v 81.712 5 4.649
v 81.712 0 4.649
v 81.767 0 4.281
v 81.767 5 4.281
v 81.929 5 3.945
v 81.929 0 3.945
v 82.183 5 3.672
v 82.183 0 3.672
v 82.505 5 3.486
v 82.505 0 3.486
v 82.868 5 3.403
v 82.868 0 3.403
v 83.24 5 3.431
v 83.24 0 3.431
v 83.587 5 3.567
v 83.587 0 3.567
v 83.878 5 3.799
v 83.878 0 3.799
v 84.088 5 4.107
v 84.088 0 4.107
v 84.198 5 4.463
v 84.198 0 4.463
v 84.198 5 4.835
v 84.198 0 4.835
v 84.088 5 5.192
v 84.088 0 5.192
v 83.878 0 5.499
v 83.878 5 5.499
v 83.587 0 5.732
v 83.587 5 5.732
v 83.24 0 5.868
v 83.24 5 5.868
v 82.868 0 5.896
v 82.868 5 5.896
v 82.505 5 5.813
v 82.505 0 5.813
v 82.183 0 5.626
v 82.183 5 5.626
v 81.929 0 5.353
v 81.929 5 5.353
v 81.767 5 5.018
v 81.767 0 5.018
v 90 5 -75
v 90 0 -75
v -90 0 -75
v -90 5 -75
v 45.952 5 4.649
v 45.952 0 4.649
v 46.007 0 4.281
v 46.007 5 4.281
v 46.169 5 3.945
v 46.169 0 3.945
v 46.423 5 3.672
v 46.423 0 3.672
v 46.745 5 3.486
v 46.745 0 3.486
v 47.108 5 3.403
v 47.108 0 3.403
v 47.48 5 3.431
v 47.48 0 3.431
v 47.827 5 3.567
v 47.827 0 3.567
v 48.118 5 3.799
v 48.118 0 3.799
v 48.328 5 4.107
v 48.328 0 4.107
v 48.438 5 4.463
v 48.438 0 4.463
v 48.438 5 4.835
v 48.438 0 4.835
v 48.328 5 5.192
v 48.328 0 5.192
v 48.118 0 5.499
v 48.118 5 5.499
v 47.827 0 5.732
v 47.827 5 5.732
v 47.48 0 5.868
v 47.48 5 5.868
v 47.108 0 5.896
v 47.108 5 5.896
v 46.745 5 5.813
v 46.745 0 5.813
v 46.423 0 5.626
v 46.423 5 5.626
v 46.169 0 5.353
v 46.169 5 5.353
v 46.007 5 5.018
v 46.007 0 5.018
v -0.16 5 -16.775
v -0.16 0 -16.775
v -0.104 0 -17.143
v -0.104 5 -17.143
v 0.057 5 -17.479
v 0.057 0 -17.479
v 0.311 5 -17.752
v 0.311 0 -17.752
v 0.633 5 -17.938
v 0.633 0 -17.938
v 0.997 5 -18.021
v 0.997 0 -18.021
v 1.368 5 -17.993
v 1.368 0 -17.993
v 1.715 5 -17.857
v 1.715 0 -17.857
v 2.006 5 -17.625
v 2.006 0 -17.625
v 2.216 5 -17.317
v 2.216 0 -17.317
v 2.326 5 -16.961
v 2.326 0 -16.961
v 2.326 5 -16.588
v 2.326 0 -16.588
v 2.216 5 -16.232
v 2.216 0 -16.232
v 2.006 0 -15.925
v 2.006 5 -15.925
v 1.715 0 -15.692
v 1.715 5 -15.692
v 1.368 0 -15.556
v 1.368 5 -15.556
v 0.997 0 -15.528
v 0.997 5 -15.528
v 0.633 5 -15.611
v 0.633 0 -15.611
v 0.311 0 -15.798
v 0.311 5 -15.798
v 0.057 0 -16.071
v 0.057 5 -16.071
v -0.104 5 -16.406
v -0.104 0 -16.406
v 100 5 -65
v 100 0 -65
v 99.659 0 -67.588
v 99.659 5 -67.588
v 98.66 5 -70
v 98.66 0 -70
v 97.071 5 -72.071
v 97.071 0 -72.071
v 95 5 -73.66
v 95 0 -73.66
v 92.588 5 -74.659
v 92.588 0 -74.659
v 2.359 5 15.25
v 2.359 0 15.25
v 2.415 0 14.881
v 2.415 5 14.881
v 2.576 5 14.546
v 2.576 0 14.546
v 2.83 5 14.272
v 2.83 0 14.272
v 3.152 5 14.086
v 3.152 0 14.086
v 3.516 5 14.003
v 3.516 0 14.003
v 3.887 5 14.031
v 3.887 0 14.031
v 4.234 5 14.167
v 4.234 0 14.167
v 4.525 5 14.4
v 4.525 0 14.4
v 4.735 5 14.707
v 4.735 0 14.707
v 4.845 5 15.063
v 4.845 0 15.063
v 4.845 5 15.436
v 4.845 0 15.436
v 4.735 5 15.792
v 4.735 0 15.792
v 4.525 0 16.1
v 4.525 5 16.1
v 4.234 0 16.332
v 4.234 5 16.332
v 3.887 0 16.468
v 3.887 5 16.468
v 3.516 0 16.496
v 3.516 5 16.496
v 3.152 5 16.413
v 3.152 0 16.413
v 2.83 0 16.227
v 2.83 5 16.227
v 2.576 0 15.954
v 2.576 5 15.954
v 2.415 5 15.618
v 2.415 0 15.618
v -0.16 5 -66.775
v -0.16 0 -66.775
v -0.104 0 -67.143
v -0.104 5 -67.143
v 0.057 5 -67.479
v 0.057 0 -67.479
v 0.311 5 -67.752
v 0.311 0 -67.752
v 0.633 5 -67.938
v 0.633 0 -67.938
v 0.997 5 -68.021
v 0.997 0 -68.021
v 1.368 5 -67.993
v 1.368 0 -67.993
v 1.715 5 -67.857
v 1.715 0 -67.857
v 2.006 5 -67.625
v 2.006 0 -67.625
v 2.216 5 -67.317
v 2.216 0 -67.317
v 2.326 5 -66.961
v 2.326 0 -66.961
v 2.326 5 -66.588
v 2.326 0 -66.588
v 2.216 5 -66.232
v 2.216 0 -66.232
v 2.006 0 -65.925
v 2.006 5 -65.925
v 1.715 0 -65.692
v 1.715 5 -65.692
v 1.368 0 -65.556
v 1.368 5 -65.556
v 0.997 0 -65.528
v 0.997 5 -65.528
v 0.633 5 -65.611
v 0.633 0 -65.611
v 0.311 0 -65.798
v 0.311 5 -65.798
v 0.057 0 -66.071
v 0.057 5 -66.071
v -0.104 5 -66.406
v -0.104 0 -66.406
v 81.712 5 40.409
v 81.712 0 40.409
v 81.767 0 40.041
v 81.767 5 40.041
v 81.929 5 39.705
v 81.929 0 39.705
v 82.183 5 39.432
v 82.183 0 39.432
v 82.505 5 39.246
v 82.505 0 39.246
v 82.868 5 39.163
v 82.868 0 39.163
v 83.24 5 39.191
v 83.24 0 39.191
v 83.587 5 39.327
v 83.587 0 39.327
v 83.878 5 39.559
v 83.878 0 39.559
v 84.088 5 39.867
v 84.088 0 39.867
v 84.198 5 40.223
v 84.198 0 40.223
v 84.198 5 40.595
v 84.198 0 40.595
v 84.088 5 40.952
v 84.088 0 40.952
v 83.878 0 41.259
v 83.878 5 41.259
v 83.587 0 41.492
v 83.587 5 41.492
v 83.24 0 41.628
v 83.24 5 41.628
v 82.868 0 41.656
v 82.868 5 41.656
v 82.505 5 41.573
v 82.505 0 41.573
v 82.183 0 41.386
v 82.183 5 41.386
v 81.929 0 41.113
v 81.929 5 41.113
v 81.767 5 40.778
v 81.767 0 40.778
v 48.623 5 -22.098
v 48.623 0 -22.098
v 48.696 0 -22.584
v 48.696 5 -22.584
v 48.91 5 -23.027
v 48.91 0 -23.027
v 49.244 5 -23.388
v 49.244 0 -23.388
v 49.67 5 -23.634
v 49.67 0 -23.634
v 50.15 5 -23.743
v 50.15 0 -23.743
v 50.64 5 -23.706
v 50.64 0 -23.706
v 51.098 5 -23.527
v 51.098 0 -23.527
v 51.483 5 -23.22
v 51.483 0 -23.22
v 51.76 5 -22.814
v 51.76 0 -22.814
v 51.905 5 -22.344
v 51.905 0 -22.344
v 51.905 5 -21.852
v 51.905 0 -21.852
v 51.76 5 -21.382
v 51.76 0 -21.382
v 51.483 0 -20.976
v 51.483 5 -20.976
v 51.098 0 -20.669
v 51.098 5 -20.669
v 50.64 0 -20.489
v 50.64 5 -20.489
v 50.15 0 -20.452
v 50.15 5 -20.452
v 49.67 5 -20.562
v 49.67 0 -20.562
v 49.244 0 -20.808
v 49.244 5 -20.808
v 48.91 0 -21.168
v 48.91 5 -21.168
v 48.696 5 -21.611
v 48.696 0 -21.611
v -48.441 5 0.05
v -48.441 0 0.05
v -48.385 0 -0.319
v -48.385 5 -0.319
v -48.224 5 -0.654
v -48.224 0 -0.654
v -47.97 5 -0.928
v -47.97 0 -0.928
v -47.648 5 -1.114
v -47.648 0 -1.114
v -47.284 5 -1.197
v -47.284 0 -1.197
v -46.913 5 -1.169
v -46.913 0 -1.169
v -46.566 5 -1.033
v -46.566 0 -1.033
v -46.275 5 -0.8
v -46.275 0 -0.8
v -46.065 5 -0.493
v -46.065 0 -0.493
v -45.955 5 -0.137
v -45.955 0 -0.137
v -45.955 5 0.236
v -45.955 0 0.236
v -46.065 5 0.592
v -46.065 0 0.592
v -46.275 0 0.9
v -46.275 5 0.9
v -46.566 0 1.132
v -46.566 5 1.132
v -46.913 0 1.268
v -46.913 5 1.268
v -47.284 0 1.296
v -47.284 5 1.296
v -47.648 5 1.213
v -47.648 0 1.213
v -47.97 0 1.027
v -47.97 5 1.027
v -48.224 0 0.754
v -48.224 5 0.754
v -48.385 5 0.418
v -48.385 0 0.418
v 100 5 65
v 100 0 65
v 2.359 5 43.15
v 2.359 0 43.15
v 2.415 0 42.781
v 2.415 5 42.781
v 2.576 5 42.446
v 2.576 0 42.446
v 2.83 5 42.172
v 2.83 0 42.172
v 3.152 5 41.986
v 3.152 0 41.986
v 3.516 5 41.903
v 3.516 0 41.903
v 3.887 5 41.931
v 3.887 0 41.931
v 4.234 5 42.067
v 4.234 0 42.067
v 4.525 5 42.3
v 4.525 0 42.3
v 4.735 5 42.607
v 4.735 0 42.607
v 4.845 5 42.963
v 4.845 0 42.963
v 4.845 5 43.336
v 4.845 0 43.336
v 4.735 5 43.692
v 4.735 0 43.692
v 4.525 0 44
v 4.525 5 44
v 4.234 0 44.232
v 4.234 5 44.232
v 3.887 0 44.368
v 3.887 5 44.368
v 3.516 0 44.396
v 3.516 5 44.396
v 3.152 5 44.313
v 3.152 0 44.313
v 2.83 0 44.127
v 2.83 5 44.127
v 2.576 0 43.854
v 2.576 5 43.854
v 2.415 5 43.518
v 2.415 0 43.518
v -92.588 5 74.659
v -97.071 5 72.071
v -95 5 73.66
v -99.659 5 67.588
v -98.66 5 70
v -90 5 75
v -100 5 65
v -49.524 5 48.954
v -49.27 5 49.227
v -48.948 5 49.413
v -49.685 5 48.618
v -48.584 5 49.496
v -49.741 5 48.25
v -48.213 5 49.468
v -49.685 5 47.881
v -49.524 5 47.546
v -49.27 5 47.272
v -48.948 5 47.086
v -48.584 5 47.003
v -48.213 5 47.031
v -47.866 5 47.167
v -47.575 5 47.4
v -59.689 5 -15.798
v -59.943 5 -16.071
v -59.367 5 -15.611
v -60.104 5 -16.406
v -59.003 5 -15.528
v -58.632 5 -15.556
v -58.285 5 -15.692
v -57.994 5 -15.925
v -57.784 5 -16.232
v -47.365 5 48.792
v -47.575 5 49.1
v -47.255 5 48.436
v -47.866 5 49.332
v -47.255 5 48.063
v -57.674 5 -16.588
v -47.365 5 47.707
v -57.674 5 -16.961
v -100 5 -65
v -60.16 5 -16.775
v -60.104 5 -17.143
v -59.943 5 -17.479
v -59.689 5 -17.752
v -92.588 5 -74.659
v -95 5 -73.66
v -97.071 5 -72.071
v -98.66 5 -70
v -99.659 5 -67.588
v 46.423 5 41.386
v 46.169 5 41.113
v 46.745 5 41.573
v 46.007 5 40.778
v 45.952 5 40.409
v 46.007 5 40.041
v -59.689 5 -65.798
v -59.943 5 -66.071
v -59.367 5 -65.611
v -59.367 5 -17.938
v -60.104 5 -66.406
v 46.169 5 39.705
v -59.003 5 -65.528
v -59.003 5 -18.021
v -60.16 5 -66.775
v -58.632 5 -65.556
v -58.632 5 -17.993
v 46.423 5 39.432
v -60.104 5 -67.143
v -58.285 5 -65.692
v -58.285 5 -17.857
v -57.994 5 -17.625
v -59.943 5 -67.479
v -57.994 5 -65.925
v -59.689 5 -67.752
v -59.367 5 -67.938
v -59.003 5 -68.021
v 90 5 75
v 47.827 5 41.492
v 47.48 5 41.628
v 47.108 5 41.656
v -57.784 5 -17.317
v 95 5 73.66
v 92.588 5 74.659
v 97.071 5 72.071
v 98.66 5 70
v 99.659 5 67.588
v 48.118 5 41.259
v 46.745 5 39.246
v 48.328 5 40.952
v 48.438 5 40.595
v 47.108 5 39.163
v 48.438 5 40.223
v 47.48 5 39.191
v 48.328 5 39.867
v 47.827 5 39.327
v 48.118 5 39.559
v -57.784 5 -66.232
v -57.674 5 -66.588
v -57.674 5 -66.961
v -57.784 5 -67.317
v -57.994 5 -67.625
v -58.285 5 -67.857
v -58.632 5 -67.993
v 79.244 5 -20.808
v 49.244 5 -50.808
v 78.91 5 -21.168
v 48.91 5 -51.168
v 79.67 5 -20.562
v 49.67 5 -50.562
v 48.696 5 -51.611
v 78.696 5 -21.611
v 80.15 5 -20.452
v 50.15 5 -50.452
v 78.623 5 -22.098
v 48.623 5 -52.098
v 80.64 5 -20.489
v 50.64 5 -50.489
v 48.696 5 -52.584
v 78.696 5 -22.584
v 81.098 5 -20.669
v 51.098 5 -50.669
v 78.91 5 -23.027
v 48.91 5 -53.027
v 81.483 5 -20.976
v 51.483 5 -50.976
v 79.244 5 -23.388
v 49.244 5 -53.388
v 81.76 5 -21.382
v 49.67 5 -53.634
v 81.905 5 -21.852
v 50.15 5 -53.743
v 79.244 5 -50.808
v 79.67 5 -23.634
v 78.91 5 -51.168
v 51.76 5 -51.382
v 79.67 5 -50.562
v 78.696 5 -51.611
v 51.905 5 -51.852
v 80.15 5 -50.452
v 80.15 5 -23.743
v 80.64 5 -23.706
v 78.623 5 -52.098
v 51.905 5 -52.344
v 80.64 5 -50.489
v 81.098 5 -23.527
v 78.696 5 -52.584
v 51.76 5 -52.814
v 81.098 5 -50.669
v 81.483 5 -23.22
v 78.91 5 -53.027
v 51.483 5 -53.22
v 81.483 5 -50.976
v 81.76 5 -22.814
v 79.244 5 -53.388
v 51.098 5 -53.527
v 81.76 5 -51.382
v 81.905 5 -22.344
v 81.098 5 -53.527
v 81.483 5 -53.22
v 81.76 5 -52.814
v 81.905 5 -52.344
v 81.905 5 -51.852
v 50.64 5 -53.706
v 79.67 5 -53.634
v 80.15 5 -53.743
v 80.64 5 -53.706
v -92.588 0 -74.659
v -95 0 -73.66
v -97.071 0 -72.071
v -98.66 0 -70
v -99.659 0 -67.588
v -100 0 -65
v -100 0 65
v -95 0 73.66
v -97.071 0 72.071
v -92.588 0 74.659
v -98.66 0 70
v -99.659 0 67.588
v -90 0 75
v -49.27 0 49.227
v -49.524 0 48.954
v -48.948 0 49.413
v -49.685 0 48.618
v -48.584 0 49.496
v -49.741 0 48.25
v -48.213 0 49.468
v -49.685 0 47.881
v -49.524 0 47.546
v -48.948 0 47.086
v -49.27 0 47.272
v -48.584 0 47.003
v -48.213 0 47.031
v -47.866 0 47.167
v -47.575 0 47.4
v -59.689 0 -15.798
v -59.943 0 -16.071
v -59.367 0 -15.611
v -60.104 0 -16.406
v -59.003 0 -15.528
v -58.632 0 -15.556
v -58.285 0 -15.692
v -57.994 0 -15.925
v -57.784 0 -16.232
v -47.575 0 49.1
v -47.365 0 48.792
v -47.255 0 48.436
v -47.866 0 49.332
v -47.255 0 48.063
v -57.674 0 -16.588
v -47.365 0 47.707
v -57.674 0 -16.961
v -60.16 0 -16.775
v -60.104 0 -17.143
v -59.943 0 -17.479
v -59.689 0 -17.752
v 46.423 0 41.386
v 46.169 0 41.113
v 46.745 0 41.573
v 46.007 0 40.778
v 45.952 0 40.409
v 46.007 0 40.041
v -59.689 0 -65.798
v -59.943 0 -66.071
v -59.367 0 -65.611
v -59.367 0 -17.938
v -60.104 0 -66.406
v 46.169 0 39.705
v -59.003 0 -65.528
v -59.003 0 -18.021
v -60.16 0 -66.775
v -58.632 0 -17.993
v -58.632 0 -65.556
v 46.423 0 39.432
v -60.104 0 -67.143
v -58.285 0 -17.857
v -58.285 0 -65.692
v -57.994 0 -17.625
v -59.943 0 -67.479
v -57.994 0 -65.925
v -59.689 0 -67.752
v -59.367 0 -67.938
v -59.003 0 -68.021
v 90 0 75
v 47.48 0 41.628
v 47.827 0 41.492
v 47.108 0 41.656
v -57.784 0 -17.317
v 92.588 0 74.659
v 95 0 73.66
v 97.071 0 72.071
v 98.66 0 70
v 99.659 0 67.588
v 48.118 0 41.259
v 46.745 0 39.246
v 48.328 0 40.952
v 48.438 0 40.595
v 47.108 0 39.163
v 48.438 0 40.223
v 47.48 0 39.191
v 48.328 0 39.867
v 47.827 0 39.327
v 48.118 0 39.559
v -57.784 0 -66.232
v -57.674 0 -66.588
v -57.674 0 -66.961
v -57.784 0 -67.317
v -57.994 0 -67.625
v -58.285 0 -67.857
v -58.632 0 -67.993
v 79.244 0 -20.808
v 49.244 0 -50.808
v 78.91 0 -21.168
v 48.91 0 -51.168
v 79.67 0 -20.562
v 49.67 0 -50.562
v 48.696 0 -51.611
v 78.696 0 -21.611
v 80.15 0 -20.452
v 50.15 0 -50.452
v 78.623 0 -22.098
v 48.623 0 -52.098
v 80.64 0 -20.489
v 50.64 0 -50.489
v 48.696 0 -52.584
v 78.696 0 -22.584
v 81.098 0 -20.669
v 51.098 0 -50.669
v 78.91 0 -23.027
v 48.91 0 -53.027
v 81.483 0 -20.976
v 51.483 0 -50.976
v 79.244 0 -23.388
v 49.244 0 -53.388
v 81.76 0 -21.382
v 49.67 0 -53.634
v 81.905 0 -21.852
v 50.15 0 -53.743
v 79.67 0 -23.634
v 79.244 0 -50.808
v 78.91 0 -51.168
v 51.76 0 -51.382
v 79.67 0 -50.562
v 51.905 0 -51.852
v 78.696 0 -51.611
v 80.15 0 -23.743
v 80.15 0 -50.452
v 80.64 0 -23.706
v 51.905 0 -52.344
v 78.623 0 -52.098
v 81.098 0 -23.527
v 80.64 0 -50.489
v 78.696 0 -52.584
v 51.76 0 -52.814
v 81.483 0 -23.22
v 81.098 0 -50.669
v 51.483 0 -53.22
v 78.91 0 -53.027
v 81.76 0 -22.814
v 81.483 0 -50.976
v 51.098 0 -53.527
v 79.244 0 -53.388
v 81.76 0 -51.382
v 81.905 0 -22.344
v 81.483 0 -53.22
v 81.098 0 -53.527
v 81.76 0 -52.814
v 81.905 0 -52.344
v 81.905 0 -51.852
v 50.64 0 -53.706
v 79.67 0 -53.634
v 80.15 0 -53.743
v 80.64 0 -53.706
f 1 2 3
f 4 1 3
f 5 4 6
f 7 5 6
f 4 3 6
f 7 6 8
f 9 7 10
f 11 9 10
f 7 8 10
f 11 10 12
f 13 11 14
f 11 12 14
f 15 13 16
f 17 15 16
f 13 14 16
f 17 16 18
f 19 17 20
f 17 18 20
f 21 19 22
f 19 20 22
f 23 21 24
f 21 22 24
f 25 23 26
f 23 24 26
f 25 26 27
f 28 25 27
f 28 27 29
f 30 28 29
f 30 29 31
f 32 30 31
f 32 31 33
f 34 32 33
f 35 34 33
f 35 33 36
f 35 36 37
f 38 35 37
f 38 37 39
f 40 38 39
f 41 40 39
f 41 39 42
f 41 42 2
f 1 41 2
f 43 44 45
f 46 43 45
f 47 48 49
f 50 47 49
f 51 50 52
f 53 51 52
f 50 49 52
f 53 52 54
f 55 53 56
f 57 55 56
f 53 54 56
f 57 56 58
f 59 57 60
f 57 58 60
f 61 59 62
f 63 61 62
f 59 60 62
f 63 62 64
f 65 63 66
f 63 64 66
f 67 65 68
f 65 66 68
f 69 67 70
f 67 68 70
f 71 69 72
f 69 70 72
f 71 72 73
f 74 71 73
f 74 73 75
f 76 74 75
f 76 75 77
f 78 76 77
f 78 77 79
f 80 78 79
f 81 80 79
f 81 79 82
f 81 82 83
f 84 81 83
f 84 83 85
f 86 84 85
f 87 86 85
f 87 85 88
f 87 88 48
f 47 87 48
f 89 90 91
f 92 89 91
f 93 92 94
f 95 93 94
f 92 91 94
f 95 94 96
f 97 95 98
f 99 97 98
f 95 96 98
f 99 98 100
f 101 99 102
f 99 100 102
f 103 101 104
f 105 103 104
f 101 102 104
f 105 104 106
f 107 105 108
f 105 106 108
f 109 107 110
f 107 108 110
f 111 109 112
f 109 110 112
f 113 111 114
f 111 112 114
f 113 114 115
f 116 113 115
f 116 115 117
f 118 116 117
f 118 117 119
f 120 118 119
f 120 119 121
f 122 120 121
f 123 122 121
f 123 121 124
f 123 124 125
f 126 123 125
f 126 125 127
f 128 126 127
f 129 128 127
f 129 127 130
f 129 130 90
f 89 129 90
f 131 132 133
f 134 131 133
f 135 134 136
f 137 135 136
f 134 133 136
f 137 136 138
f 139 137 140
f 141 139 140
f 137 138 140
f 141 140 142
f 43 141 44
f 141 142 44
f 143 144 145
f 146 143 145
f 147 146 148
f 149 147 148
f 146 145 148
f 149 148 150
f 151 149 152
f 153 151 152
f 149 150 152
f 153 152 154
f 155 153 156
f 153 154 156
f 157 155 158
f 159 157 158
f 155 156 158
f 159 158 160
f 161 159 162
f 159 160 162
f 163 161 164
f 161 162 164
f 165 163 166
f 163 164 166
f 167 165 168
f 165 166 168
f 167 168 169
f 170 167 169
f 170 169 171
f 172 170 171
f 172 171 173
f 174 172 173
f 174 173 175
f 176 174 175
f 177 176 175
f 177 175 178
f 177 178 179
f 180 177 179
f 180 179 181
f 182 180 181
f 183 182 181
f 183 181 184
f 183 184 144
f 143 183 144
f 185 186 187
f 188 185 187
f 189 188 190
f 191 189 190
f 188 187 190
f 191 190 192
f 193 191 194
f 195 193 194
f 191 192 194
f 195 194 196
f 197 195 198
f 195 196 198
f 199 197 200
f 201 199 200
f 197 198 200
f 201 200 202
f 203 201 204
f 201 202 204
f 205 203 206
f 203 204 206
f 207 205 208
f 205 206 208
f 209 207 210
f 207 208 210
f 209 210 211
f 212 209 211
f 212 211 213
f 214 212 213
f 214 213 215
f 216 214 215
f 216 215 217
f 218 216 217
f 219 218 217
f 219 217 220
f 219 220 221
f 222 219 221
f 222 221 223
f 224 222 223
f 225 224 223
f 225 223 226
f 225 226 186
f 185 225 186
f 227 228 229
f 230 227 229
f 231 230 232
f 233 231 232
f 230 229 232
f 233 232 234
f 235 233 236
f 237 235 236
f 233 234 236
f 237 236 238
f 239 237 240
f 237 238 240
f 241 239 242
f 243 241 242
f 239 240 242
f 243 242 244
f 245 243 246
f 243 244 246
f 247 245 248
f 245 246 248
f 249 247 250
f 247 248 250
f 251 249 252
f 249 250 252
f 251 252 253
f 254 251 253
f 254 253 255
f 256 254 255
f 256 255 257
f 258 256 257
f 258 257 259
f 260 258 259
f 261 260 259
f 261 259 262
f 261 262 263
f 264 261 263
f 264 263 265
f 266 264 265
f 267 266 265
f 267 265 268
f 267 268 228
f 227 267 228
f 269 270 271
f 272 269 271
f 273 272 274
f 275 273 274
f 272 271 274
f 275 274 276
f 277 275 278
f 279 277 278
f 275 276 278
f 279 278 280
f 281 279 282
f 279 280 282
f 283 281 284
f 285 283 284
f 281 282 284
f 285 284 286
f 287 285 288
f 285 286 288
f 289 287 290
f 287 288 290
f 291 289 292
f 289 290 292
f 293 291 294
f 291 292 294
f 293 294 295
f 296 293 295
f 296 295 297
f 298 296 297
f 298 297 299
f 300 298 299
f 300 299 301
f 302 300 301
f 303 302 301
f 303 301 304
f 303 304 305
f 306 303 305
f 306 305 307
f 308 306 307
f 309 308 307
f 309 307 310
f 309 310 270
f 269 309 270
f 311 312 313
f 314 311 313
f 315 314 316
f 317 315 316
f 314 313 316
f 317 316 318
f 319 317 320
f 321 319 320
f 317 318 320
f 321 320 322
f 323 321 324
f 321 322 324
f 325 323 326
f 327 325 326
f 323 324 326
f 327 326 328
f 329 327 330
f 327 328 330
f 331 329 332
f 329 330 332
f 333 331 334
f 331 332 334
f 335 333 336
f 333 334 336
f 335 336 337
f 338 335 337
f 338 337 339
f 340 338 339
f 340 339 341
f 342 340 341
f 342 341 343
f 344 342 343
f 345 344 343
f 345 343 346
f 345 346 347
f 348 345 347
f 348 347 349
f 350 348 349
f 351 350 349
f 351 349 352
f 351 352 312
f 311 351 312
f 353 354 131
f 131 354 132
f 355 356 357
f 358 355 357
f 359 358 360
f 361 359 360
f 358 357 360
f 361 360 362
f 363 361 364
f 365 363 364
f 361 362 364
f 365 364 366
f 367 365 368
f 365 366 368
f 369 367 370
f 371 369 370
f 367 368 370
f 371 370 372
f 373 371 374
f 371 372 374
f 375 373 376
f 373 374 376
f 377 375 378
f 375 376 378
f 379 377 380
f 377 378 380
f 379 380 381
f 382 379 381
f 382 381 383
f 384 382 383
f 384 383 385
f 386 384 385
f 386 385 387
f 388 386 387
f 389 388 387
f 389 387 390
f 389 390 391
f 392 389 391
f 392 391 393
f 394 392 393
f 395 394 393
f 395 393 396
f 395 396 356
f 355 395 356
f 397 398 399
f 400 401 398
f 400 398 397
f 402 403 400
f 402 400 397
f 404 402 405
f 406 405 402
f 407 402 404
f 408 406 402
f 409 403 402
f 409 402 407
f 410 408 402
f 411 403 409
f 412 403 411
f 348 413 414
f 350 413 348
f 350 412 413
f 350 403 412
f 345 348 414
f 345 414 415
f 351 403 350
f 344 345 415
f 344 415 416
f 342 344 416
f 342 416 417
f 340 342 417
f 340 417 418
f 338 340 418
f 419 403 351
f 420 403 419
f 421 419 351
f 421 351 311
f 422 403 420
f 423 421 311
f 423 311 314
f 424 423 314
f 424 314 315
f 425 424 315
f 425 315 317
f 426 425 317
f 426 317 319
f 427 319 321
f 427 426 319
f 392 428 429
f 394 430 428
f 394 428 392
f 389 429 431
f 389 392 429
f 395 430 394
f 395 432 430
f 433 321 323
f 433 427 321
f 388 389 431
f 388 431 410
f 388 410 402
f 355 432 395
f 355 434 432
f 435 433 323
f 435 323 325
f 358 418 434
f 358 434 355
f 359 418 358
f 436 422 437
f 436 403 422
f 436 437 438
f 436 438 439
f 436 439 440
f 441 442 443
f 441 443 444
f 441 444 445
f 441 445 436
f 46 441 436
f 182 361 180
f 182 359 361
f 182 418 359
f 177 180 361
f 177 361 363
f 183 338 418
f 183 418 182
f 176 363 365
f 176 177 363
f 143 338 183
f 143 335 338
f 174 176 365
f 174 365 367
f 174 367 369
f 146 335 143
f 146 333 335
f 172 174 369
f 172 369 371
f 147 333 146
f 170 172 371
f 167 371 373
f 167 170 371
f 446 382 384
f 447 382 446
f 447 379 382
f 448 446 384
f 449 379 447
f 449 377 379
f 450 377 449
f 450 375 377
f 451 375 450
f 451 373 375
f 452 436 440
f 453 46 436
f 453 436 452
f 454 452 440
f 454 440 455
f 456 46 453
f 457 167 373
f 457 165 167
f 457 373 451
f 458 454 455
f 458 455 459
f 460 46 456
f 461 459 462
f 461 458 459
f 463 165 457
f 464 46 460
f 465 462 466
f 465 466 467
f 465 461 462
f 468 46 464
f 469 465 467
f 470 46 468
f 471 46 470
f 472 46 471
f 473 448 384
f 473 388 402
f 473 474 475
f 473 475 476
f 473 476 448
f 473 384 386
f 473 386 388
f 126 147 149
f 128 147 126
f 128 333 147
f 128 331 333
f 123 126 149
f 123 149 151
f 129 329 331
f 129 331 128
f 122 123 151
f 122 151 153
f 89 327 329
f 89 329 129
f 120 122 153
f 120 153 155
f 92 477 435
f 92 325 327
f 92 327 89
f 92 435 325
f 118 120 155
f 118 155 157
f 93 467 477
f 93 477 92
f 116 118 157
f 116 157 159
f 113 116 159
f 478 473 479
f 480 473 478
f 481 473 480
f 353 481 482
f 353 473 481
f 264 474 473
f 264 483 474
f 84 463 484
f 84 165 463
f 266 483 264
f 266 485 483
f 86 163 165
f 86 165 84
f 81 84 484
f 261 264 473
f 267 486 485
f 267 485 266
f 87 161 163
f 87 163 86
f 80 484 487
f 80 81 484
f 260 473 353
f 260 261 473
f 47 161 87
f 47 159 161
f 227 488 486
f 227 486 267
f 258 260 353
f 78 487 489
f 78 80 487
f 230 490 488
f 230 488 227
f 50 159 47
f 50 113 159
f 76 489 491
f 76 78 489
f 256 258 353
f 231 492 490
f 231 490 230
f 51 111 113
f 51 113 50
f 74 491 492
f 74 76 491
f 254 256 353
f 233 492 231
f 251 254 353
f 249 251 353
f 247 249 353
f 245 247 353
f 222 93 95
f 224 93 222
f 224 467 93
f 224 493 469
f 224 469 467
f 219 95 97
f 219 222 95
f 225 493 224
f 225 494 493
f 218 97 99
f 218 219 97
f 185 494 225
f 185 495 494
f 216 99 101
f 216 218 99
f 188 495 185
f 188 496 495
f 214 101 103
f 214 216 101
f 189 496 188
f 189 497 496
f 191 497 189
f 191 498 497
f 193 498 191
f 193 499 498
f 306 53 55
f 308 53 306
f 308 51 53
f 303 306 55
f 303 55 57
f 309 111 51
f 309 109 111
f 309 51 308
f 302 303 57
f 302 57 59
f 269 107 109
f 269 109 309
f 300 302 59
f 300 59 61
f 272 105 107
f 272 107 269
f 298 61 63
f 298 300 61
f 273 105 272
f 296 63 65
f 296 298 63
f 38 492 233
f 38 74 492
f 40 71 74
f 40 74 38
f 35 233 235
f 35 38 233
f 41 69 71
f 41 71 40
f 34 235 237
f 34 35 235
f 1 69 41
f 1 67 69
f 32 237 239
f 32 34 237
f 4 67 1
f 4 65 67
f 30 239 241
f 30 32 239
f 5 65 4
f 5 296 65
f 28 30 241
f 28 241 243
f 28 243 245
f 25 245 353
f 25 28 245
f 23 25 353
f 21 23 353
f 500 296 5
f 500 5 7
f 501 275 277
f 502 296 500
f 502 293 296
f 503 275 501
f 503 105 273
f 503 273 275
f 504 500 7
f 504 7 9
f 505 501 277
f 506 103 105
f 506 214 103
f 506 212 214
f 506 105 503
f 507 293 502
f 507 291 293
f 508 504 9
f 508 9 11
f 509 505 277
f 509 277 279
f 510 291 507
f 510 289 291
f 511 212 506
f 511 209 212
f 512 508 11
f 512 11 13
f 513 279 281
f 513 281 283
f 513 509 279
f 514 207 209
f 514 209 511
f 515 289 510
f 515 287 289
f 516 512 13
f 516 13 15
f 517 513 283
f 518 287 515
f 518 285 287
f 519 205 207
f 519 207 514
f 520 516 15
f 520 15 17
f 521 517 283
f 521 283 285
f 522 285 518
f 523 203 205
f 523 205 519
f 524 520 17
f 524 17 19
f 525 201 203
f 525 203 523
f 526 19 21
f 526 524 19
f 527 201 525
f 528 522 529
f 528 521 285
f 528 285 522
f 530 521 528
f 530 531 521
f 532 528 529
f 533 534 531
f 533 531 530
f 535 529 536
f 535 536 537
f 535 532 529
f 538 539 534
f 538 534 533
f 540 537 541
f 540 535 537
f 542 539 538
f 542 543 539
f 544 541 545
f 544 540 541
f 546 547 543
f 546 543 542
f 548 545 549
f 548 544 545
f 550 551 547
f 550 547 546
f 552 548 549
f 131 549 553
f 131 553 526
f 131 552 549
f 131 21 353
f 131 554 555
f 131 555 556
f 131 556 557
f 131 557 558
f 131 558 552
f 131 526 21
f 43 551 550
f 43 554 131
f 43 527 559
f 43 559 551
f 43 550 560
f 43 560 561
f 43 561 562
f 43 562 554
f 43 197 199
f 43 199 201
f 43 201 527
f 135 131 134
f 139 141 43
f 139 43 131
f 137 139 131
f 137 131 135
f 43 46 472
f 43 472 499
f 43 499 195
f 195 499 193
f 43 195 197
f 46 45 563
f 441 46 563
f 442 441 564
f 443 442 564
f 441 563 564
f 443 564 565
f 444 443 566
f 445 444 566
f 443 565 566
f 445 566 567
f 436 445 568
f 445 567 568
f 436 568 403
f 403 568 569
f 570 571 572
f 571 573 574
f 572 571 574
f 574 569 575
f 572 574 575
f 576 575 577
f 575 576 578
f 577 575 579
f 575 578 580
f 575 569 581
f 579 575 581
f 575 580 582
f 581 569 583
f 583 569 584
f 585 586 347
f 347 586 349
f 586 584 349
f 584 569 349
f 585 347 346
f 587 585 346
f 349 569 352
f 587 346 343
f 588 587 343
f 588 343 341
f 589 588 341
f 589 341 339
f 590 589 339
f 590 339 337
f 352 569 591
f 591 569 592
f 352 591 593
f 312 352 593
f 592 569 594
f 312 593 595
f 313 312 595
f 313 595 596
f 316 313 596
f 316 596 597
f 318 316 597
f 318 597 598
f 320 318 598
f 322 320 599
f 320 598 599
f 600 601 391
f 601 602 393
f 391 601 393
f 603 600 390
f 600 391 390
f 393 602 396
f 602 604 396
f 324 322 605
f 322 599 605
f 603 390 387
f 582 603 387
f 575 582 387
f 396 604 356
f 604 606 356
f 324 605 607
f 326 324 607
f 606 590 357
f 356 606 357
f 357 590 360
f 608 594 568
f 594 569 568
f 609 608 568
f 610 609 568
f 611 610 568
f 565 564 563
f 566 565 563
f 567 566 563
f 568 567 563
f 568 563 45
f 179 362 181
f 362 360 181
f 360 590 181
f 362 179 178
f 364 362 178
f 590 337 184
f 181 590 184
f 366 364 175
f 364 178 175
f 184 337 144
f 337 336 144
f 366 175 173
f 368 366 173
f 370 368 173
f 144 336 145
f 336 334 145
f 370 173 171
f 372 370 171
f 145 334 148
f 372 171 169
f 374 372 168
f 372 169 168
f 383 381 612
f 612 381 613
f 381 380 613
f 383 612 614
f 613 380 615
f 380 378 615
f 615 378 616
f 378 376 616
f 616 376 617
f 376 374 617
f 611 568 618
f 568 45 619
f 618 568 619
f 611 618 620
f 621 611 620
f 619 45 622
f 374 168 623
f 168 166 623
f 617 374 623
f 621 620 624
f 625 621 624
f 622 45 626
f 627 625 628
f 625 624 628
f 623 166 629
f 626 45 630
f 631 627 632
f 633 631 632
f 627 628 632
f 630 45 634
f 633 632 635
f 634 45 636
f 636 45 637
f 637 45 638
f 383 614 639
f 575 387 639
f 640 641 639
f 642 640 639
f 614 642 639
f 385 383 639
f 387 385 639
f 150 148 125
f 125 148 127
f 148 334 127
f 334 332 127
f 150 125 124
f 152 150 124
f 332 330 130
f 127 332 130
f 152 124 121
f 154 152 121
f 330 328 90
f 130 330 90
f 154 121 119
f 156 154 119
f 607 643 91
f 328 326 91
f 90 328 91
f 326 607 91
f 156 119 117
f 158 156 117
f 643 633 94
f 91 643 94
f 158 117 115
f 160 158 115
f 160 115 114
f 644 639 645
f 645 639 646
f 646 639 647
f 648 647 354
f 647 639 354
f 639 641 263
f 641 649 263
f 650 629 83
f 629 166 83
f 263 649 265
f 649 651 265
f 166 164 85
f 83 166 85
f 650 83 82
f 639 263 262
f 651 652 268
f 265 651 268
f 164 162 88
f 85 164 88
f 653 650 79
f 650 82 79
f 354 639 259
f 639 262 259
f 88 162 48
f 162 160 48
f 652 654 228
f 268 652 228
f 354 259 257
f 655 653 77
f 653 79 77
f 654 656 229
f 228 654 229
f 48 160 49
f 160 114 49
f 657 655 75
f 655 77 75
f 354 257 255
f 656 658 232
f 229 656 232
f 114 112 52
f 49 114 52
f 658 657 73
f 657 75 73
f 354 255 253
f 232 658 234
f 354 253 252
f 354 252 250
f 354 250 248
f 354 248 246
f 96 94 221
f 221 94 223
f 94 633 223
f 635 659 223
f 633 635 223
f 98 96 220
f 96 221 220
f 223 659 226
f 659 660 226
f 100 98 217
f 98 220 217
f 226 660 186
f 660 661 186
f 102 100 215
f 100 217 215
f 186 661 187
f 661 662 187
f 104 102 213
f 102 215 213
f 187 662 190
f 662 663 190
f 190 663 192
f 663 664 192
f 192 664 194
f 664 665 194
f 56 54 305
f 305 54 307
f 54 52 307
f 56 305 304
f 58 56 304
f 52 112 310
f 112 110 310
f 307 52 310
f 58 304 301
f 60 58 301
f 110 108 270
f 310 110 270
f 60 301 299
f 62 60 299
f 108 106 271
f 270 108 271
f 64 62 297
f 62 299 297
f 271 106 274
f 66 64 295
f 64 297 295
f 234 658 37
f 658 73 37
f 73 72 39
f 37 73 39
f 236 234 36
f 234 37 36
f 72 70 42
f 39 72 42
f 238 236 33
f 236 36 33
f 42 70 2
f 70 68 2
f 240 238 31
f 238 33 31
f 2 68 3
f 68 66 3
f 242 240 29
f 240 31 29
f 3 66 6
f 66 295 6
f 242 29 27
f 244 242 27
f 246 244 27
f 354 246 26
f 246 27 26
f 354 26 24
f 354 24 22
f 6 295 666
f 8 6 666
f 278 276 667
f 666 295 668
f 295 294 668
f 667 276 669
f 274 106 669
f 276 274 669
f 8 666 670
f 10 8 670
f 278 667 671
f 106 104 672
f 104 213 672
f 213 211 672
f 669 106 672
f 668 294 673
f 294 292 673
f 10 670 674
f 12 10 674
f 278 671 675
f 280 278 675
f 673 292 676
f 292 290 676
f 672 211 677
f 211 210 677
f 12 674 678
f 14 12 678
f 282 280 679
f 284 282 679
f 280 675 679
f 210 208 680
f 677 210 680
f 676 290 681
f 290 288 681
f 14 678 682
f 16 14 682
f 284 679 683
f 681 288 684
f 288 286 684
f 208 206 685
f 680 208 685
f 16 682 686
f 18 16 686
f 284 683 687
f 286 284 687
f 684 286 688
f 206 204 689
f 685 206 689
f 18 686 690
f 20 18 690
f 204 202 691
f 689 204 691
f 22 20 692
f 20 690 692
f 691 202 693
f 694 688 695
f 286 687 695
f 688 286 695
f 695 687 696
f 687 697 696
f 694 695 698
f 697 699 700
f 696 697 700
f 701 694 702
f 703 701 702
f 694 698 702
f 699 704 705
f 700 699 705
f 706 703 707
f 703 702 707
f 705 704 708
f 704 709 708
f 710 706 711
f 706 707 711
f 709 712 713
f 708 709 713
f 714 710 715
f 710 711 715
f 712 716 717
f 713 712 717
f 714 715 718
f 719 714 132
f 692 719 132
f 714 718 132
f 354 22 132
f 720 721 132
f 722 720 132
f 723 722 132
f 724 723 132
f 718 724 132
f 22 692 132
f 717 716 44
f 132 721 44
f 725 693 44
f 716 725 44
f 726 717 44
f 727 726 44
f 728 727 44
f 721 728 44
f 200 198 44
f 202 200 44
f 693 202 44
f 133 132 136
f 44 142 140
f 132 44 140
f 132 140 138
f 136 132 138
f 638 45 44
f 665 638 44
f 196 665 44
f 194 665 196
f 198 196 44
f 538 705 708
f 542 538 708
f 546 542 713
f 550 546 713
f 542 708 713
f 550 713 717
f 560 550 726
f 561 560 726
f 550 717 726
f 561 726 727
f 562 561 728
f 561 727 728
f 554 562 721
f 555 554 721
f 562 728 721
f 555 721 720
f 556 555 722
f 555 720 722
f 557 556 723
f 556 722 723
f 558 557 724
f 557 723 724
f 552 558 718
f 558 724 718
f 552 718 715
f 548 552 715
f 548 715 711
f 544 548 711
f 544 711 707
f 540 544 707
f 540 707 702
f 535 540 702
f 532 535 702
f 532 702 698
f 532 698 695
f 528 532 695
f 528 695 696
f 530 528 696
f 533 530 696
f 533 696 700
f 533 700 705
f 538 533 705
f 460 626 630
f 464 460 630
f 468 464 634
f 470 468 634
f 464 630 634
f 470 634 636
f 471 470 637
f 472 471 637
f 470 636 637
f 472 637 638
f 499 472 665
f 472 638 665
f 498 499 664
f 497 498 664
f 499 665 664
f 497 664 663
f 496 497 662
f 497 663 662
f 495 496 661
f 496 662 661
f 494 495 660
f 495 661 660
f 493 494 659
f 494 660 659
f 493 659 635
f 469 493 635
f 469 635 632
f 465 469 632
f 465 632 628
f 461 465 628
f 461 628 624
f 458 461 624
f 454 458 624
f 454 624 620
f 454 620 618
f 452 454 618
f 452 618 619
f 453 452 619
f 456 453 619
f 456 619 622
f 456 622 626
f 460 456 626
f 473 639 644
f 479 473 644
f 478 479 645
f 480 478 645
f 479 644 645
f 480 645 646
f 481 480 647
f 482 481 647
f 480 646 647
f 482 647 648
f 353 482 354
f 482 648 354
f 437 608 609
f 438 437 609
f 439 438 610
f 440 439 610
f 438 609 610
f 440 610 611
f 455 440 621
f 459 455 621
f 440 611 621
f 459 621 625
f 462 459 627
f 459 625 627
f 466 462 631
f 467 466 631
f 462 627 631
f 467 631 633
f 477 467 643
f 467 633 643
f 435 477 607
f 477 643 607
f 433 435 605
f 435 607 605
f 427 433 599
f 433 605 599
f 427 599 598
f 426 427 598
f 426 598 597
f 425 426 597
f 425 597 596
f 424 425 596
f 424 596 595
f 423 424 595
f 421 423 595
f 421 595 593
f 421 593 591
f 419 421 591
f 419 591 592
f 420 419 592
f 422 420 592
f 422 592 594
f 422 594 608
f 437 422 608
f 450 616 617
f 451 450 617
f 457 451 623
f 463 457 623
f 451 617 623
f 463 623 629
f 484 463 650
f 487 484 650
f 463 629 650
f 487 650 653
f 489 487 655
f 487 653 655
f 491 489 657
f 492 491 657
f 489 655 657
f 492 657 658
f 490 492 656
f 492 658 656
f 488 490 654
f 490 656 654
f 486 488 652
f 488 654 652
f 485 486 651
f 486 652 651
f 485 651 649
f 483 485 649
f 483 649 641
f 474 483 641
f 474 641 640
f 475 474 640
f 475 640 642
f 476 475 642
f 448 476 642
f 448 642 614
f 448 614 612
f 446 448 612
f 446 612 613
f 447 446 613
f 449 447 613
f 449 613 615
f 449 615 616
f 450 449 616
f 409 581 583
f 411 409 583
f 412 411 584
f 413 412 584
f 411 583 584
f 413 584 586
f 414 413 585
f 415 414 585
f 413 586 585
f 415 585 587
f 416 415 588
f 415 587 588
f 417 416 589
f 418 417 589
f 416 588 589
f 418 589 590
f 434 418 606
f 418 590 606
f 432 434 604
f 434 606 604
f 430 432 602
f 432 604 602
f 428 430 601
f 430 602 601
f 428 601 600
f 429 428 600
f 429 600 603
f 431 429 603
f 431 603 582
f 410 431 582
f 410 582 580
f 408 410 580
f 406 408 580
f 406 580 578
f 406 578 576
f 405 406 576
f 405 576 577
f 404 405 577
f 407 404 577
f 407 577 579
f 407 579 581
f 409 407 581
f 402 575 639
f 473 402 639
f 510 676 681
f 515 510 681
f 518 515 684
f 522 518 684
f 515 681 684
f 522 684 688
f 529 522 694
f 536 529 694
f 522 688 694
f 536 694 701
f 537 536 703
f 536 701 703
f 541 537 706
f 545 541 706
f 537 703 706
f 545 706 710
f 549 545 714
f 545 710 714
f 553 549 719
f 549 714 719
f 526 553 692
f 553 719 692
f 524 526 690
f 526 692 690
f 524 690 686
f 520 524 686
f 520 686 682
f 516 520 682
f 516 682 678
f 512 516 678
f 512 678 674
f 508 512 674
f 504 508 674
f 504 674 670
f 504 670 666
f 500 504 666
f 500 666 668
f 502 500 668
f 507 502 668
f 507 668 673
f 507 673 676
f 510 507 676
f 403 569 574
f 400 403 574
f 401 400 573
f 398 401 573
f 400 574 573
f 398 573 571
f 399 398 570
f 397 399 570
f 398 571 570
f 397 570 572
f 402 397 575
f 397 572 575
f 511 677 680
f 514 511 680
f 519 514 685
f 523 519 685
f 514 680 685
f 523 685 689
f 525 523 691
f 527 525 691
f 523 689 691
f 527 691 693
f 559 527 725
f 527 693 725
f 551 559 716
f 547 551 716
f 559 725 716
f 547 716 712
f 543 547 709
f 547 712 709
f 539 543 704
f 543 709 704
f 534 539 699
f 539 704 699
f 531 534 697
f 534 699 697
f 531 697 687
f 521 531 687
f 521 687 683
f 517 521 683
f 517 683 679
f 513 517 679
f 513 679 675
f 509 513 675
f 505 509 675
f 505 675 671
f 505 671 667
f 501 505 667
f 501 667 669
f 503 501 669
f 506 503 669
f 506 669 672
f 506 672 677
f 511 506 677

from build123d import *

# Parameters (mm, degrees)
BOSS_EXTRUDE1_DEPTH            = 5
ARDUINO_UNO_HOLES_D            = 2.5
L298N_HOLES_D                  = 2.5
MOTOR_MOUNTING_BRACKET_HOLES_D = 3.3
PROTOBOARD_HOLES_D             = 2.5


with BuildPart() as part:
    # Sketch1 → Boss-Extrude1 (new body)
    with BuildSketch(Plane(origin=(0, 0, 0), x_dir=(1, 0, 0), z_dir=(0, 1, 0))):
        with BuildLine():
            Line((-90, -75), (90, -75))
            ThreePointArc((90, -75), (97.071067812, -72.071067812), (100, -65))
            Line((100, -65), (100, 65))
            ThreePointArc((100, 65), (97.071067812, 72.071067812), (90, 75))
            Line((90, 75), (-90, 75))
            ThreePointArc((-90, 75), (-97.071067812, 72.071067812), (-100, 65))
            Line((-100, 65), (-100, -65))
            ThreePointArc((-100, -65), (-97.071067812, -72.071067812), (-90, -75))
        make_face()
    extrude(amount=BOSS_EXTRUDE1_DEPTH)

    # arduino uno holes (through all)
    with Locations(Plane(origin=(0, 5, 0), x_dir=(1, 0, 0), z_dir=(0, 1, 0))):
        with Locations((3.609044644, -15.249784892), (3.609044644, -43.149784892), (-47.190955356, -0.049784892), (-48.490955356, -48.249784892)):
            Hole(ARDUINO_UNO_HOLES_D / 2)

    # l298n holes (through all)
    with Locations(Plane(origin=(0, 5, 0), x_dir=(1, 0, 0), z_dir=(0, 1, 0))):
        with Locations((47.201873377, -40.409180512), (82.961873377, -40.409180512), (82.961873377, -4.649180512), (47.201873377, -4.649180512)):
            Hole(L298N_HOLES_D / 2)

    # motor mounting bracket holes (through all)
    with Locations(Plane(origin=(0, 5, 0), x_dir=(1, 0, 0), z_dir=(0, 1, 0))):
        with Locations((50.273035044, 22.097798604), (80.273035044, 22.097798604), (80.273035044, 52.097798604), (50.273035044, 52.097798604)):
            Hole(MOTOR_MOUNTING_BRACKET_HOLES_D / 2)

    # protoboard holes (through all)
    with Locations(Plane(origin=(0, 5, 0), x_dir=(1, 0, 0), z_dir=(0, 1, 0))):
        with Locations((-58.909900465, 16.774792285), (1.090099535, 16.774792285), (1.090099535, 66.774792285), (-58.909900465, 66.774792285)):
            Hole(PROTOBOARD_HOLES_D / 2)


solid = part.part
